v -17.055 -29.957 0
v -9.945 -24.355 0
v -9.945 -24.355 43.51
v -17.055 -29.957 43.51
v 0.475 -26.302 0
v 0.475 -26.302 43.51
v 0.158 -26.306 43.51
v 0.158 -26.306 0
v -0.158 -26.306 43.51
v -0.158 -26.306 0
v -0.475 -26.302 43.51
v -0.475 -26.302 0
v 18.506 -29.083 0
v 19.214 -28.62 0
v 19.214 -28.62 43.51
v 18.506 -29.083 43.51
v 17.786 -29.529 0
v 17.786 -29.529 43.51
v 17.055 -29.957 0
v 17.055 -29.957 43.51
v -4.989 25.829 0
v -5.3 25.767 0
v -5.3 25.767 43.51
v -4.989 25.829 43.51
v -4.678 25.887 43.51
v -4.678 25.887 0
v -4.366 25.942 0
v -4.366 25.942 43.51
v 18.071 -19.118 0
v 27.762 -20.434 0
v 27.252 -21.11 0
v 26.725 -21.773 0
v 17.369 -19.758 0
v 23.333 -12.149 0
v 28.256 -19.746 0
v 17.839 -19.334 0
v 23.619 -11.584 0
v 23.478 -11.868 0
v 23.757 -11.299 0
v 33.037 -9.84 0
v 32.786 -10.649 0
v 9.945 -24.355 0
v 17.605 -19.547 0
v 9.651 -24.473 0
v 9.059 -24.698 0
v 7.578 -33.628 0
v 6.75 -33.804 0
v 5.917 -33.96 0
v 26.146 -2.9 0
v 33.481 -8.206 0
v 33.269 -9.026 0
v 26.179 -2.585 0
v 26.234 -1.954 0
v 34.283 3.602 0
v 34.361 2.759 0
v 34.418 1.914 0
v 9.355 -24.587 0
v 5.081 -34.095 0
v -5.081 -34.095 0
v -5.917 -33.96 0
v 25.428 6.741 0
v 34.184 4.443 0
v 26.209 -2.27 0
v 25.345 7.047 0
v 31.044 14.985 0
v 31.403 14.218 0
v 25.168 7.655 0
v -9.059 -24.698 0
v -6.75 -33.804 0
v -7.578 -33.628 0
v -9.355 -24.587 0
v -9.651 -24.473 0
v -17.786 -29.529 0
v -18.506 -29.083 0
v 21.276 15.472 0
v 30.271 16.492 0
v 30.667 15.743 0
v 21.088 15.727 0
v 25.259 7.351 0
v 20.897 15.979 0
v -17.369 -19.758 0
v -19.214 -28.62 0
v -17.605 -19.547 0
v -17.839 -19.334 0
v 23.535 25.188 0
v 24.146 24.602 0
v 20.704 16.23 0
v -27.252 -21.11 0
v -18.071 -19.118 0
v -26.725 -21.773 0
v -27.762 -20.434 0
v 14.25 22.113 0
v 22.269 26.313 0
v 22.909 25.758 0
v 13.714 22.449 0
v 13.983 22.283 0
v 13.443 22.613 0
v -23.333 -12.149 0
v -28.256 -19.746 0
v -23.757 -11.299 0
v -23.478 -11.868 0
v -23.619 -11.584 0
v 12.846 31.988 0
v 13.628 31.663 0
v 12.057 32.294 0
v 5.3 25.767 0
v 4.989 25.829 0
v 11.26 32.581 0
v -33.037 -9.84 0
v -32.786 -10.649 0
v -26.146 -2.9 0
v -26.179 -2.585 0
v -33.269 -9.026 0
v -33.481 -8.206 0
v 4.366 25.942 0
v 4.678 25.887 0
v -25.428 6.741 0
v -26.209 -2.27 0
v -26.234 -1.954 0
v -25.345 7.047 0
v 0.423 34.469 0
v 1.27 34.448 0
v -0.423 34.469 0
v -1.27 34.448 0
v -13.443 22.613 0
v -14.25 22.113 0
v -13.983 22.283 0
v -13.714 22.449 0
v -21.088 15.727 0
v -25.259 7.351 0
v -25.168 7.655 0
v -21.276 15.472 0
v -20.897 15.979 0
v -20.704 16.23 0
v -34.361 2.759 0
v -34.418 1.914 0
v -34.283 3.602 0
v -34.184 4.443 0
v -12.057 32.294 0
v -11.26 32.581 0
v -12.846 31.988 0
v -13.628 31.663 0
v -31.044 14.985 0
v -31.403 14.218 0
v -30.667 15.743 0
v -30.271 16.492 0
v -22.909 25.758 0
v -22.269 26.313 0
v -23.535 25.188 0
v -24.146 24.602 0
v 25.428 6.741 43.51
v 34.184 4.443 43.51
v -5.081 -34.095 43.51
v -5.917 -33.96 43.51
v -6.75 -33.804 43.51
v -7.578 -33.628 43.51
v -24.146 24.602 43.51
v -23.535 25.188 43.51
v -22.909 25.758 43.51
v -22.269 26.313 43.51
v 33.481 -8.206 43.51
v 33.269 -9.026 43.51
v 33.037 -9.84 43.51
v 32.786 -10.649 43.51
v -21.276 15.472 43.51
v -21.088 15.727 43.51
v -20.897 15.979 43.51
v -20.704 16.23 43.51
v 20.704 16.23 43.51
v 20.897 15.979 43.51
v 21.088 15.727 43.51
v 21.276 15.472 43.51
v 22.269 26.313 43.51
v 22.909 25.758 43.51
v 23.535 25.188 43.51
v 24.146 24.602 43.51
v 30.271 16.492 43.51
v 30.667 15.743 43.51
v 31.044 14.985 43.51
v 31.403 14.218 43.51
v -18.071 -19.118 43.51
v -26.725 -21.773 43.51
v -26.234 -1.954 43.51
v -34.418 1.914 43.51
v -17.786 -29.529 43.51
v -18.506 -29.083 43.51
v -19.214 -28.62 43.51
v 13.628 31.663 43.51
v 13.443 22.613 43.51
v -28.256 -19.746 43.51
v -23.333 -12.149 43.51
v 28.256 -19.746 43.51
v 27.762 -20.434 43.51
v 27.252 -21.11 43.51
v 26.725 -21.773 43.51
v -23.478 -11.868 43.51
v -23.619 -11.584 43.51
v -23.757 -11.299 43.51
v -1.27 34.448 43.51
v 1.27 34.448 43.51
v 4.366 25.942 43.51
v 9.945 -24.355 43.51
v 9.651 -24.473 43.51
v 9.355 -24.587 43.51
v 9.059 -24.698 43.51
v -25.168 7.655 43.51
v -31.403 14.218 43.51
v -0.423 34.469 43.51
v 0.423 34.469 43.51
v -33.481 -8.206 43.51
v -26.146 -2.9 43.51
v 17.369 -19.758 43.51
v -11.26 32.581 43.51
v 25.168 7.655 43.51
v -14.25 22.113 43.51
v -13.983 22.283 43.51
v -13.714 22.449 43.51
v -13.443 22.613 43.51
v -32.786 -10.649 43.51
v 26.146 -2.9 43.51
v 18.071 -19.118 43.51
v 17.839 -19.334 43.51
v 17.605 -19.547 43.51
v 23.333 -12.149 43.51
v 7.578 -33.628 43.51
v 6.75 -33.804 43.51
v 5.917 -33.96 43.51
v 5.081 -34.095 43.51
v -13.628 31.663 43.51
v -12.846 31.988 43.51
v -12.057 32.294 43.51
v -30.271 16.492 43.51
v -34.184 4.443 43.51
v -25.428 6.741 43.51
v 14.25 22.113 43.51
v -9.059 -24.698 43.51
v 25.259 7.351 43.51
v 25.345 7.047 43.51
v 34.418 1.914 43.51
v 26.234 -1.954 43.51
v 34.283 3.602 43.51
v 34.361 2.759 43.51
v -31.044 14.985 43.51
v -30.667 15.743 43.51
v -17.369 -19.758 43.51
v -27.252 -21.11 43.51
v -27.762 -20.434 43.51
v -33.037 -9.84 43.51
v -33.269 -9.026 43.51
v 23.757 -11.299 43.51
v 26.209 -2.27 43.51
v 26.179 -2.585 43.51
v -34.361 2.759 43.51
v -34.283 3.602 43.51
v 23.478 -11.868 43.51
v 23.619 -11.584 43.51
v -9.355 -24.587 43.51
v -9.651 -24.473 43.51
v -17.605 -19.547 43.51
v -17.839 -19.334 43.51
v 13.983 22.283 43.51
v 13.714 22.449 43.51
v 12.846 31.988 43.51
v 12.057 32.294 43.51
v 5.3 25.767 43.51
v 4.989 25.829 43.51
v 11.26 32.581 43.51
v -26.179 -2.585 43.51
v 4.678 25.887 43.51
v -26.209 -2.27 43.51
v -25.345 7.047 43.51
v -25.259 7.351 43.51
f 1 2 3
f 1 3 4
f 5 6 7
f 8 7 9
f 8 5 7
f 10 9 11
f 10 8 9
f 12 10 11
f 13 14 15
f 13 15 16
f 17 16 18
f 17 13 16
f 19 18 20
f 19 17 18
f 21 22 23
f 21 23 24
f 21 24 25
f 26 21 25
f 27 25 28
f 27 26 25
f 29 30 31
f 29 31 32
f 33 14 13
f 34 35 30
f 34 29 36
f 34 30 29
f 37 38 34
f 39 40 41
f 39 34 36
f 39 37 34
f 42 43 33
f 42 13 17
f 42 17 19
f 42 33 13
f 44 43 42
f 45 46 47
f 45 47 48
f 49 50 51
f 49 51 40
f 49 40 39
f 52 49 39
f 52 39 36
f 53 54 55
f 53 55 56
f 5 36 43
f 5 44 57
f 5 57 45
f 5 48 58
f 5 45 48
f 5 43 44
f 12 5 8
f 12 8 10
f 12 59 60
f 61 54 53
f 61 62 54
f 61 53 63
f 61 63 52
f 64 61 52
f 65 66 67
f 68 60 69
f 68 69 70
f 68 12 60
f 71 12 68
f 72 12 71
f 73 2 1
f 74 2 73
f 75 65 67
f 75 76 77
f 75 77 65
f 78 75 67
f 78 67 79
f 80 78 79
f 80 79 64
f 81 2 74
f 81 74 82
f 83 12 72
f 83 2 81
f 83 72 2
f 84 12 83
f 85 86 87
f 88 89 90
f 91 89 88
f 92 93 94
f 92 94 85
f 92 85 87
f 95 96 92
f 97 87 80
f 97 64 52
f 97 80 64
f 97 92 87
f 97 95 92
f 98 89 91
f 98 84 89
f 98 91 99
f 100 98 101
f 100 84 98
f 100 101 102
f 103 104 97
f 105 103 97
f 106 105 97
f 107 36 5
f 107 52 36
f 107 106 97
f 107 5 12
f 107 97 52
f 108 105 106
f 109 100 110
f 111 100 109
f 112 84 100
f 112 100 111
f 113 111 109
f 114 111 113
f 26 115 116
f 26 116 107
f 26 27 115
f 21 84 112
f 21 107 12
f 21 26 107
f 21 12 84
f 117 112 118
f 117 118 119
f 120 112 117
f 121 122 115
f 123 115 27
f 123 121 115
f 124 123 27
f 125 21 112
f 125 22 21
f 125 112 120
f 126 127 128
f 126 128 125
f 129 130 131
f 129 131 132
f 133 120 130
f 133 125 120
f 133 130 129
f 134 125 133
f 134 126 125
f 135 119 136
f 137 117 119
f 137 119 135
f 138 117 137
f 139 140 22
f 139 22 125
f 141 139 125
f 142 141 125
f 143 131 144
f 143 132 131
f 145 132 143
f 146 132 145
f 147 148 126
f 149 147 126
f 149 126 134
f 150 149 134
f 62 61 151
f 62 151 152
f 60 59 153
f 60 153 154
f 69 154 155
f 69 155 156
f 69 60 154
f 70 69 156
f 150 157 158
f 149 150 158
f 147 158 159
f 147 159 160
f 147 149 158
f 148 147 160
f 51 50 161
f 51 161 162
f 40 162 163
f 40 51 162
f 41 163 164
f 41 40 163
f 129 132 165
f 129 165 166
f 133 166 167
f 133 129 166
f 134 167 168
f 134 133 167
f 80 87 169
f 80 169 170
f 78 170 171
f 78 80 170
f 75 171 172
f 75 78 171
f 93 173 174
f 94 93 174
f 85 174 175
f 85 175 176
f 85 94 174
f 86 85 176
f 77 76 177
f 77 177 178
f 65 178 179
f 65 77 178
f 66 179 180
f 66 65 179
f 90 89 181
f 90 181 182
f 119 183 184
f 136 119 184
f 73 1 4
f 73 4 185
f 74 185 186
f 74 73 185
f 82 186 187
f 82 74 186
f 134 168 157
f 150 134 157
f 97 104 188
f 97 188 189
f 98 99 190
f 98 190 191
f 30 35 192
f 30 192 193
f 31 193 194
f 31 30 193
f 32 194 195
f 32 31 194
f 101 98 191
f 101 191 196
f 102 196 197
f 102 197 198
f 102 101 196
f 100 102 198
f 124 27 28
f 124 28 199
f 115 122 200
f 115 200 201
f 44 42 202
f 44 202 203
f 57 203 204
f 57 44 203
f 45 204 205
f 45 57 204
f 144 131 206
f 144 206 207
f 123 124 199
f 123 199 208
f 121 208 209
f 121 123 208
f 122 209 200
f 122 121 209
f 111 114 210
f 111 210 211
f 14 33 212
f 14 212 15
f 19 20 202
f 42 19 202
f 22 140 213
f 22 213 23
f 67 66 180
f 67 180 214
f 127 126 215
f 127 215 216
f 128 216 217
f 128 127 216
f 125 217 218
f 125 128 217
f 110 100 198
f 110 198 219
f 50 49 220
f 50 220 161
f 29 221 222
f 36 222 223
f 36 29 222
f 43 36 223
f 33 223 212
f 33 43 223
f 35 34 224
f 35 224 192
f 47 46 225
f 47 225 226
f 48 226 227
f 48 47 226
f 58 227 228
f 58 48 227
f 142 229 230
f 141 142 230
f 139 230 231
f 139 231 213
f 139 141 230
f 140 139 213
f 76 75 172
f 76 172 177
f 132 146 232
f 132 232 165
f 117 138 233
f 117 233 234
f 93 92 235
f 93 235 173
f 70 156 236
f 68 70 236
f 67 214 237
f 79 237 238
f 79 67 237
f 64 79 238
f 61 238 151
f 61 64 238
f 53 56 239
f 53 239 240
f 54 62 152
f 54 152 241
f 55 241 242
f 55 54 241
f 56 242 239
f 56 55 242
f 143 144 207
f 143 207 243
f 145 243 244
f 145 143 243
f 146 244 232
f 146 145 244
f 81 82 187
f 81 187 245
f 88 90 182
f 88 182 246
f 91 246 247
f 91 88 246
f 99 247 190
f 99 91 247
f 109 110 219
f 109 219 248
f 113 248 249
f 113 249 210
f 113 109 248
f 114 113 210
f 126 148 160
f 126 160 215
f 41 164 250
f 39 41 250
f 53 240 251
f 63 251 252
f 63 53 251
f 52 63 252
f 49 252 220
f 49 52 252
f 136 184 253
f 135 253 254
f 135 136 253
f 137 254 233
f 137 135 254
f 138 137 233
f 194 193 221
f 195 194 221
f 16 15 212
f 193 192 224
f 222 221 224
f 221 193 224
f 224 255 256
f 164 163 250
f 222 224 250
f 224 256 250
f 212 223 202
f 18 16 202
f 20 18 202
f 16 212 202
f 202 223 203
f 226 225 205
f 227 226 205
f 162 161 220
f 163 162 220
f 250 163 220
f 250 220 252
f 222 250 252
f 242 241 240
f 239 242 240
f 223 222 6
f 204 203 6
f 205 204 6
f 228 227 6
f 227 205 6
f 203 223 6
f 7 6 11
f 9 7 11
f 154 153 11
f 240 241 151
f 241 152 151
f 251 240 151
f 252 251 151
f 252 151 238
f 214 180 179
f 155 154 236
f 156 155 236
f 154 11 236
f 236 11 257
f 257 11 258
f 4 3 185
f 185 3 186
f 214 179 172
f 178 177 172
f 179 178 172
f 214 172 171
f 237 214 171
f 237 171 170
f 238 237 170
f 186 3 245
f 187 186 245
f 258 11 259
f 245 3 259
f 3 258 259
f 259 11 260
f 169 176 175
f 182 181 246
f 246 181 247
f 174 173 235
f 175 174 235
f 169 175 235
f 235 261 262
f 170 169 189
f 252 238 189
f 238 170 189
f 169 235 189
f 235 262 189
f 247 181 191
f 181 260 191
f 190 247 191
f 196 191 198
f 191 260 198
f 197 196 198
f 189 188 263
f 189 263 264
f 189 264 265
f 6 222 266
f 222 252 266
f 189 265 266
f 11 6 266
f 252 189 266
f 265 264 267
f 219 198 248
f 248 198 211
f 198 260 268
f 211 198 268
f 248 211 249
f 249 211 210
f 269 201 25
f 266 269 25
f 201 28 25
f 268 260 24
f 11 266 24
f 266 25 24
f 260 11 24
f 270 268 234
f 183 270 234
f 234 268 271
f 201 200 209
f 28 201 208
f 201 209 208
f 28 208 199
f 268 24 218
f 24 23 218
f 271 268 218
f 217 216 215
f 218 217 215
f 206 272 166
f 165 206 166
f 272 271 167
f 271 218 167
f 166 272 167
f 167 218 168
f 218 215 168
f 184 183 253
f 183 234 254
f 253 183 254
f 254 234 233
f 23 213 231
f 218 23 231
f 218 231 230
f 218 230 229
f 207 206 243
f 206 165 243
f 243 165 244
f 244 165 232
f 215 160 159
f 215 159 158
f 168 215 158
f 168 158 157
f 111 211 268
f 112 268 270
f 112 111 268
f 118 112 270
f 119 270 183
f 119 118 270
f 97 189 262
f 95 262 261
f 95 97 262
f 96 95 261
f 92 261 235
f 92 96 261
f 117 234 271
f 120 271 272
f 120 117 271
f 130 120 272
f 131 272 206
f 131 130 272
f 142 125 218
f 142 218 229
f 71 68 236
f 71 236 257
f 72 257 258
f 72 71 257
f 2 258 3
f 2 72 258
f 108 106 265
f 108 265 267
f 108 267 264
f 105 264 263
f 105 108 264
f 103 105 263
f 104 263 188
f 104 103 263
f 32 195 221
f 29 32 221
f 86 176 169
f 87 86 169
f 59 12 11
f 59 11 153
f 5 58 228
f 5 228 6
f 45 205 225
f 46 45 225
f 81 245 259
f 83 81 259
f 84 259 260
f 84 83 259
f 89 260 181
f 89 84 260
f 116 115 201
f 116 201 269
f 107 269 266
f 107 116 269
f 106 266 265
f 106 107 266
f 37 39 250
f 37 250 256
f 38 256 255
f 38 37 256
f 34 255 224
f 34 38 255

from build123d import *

# Parameters (mm, degrees)
BOSS_EXTRUDE1_DEPTH = 43.5102


with BuildPart() as part:
    # Sketch2 → Boss-Extrude1 (new body)
    with BuildSketch(Plane.XY):
        with BuildLine():
            Line((-4.366026501, 25.941944541), (-1.27, 34.448207442))
            ThreePointArc((-1.27, 34.448207442), (0, 34.47161), (1.27, 34.448207442))
            Line((1.27, 34.448207442), (4.366026501, 25.941944541))
            ThreePointArc((4.366026501, 25.941944541), (4.83385814, 25.858857079), (5.300112805, 25.767333549))
            Line((5.300112805, 25.767333549), (11.259888122, 32.580773709))
            ThreePointArc((11.259888122, 32.580773709), (12.452581833, 32.143819028), (13.628367585, 31.663219877))
            Line((13.628367585, 31.663219877), (13.442509735, 22.612952173))
            ThreePointArc((13.442509735, 22.612952173), (13.848735094, 22.366475142), (14.250442508, 22.11270138))
            Line((14.250442508, 22.11270138), (22.26906596, 26.31312595))
            ThreePointArc((22.26906596, 26.31312595), (23.223373486, 25.474827181), (24.14614861, 24.601939015))
            Line((24.14614861, 24.601939015), (20.703507542, 16.229955312))
            ThreePointArc((20.703507542, 16.229955312), (20.993263634, 15.8533768), (21.276170986, 15.471626358))
            Line((21.276170986, 15.471626358), (30.270683044, 16.491744725))
            ThreePointArc((30.270683044, 16.491744725), (30.857719866, 15.365318762), (31.402858467, 14.218029965))
            Line((31.402858467, 14.218029965), (25.168381933, 7.655013053))
            ThreePointArc((25.168381933, 7.655013053), (25.302535593, 7.199192074), (25.428434676, 6.741022466))
            Line((25.428434676, 6.741022466), (34.184076646, 4.443061991))
            ThreePointArc((34.184076646, 4.443061991), (34.324560189, 3.180638903), (34.418438279, 1.913897183))
            Line((34.418438279, 1.913897183), (26.234126882, -1.953781138))
            ThreePointArc((26.234126882, -1.953781138), (26.194559914, -2.427283433), (26.14644736, -2.899993864))
            Line((26.14644736, -2.899993864), (33.480721277, -8.205680884))
            ThreePointArc((33.480721277, -8.205680884), (33.155678459, -9.433603865), (32.785617282, -10.648718018))
            Line((32.785617282, -10.648718018), (23.756807626, -11.298706359))
            ThreePointArc((23.756807626, -11.298706359), (23.54886377, -11.725940863), (23.333237446, -12.149349953))
            Line((23.333237446, -12.149349953), (28.255608976, -19.746201087))
            ThreePointArc((28.255608976, -19.746201087), (27.508938632, -20.773786158), (26.724917, -21.773164845))
            Line((26.724917, -21.773164845), (18.07099986, -19.117678678))
            ThreePointArc((18.07099986, -19.117678678), (17.722763084, -19.440945003), (17.36874452, -19.757869009))
            Line((17.36874452, -19.757869009), (19.214420114, -28.619887416))
            ThreePointArc((19.214420114, -28.619887416), (18.14696421, -29.308353518), (17.054868589, -29.95702511))
            Line((17.054868589, -29.95702511), (9.944603428, -24.354702557))
            ThreePointArc((9.944603428, -24.354702557), (9.503105039, -24.530341795), (9.058506404, -24.697978373))
            Line((9.058506404, -24.697978373), (7.578217344, -33.628299361))
            ThreePointArc((7.578217344, -33.628299361), (6.334141716, -33.884665333), (5.081465671, -34.095023136))
            Line((5.081465671, -34.095023136), (0.475133198, -26.302488901))
            ThreePointArc((0.475133198, -26.302488901), (0, -26.30678), (-0.475133198, -26.302488901))
            Line((-0.475133198, -26.302488901), (-5.081465671, -34.095023136))
            ThreePointArc((-5.081465671, -34.095023136), (-6.334141716, -33.884665333), (-7.578217344, -33.628299361))
            Line((-7.578217344, -33.628299361), (-9.058506404, -24.697978373))
            ThreePointArc((-9.058506404, -24.697978373), (-9.503105039, -24.530341795), (-9.944603428, -24.354702557))
            Line((-9.944603428, -24.354702557), (-17.054868589, -29.95702511))
            ThreePointArc((-17.054868589, -29.95702511), (-18.14696421, -29.308353518), (-19.214420114, -28.619887416))
            Line((-19.214420114, -28.619887416), (-17.36874452, -19.757869009))
            ThreePointArc((-17.36874452, -19.757869009), (-17.722763084, -19.440945003), (-18.07099986, -19.117678678))
            Line((-18.07099986, -19.117678678), (-26.724917, -21.773164845))
            ThreePointArc((-26.724917, -21.773164845), (-27.508938632, -20.773786158), (-28.255608976, -19.746201087))
            Line((-28.255608976, -19.746201087), (-23.333237446, -12.149349953))
            ThreePointArc((-23.333237446, -12.149349953), (-23.54886377, -11.725940863), (-23.756807626, -11.298706359))
            Line((-23.756807626, -11.298706359), (-32.785617282, -10.648718018))
            ThreePointArc((-32.785617282, -10.648718018), (-33.155678459, -9.433603865), (-33.480721277, -8.205680884))
            Line((-33.480721277, -8.205680884), (-26.14644736, -2.899993864))
            ThreePointArc((-26.14644736, -2.899993864), (-26.194559914, -2.427283433), (-26.234126882, -1.953781138))
            Line((-26.234126882, -1.953781138), (-34.418438279, 1.913897183))
            ThreePointArc((-34.418438279, 1.913897183), (-34.324560189, 3.180638903), (-34.184076646, 4.443061991))
            Line((-34.184076646, 4.443061991), (-25.428434676, 6.741022466))
            ThreePointArc((-25.428434676, 6.741022466), (-25.302535593, 7.199192074), (-25.168381933, 7.655013053))
            Line((-25.168381933, 7.655013053), (-31.402858467, 14.218029965))
            ThreePointArc((-31.402858467, 14.218029965), (-30.857719866, 15.365318762), (-30.270683044, 16.491744725))
            Line((-30.270683044, 16.491744725), (-21.276170986, 15.471626358))
            ThreePointArc((-21.276170986, 15.471626358), (-20.993263634, 15.8533768), (-20.703507542, 16.229955312))
            Line((-20.703507542, 16.229955312), (-24.14614861, 24.601939015))
            ThreePointArc((-24.14614861, 24.601939015), (-23.223373486, 25.474827181), (-22.26906596, 26.31312595))
            Line((-22.26906596, 26.31312595), (-14.250442508, 22.11270138))
            ThreePointArc((-14.250442508, 22.11270138), (-13.848735094, 22.366475142), (-13.442509735, 22.612952173))
            Line((-13.442509735, 22.612952173), (-13.628367585, 31.663219877))
            ThreePointArc((-13.628367585, 31.663219877), (-12.452581833, 32.143819028), (-11.259888122, 32.580773709))
            Line((-11.259888122, 32.580773709), (-5.300112805, 25.767333549))
            ThreePointArc((-5.300112805, 25.767333549), (-4.83385814, 25.858857079), (-4.366026501, 25.941944541))
        make_face()
    extrude(amount=BOSS_EXTRUDE1_DEPTH)


solid = part.part
